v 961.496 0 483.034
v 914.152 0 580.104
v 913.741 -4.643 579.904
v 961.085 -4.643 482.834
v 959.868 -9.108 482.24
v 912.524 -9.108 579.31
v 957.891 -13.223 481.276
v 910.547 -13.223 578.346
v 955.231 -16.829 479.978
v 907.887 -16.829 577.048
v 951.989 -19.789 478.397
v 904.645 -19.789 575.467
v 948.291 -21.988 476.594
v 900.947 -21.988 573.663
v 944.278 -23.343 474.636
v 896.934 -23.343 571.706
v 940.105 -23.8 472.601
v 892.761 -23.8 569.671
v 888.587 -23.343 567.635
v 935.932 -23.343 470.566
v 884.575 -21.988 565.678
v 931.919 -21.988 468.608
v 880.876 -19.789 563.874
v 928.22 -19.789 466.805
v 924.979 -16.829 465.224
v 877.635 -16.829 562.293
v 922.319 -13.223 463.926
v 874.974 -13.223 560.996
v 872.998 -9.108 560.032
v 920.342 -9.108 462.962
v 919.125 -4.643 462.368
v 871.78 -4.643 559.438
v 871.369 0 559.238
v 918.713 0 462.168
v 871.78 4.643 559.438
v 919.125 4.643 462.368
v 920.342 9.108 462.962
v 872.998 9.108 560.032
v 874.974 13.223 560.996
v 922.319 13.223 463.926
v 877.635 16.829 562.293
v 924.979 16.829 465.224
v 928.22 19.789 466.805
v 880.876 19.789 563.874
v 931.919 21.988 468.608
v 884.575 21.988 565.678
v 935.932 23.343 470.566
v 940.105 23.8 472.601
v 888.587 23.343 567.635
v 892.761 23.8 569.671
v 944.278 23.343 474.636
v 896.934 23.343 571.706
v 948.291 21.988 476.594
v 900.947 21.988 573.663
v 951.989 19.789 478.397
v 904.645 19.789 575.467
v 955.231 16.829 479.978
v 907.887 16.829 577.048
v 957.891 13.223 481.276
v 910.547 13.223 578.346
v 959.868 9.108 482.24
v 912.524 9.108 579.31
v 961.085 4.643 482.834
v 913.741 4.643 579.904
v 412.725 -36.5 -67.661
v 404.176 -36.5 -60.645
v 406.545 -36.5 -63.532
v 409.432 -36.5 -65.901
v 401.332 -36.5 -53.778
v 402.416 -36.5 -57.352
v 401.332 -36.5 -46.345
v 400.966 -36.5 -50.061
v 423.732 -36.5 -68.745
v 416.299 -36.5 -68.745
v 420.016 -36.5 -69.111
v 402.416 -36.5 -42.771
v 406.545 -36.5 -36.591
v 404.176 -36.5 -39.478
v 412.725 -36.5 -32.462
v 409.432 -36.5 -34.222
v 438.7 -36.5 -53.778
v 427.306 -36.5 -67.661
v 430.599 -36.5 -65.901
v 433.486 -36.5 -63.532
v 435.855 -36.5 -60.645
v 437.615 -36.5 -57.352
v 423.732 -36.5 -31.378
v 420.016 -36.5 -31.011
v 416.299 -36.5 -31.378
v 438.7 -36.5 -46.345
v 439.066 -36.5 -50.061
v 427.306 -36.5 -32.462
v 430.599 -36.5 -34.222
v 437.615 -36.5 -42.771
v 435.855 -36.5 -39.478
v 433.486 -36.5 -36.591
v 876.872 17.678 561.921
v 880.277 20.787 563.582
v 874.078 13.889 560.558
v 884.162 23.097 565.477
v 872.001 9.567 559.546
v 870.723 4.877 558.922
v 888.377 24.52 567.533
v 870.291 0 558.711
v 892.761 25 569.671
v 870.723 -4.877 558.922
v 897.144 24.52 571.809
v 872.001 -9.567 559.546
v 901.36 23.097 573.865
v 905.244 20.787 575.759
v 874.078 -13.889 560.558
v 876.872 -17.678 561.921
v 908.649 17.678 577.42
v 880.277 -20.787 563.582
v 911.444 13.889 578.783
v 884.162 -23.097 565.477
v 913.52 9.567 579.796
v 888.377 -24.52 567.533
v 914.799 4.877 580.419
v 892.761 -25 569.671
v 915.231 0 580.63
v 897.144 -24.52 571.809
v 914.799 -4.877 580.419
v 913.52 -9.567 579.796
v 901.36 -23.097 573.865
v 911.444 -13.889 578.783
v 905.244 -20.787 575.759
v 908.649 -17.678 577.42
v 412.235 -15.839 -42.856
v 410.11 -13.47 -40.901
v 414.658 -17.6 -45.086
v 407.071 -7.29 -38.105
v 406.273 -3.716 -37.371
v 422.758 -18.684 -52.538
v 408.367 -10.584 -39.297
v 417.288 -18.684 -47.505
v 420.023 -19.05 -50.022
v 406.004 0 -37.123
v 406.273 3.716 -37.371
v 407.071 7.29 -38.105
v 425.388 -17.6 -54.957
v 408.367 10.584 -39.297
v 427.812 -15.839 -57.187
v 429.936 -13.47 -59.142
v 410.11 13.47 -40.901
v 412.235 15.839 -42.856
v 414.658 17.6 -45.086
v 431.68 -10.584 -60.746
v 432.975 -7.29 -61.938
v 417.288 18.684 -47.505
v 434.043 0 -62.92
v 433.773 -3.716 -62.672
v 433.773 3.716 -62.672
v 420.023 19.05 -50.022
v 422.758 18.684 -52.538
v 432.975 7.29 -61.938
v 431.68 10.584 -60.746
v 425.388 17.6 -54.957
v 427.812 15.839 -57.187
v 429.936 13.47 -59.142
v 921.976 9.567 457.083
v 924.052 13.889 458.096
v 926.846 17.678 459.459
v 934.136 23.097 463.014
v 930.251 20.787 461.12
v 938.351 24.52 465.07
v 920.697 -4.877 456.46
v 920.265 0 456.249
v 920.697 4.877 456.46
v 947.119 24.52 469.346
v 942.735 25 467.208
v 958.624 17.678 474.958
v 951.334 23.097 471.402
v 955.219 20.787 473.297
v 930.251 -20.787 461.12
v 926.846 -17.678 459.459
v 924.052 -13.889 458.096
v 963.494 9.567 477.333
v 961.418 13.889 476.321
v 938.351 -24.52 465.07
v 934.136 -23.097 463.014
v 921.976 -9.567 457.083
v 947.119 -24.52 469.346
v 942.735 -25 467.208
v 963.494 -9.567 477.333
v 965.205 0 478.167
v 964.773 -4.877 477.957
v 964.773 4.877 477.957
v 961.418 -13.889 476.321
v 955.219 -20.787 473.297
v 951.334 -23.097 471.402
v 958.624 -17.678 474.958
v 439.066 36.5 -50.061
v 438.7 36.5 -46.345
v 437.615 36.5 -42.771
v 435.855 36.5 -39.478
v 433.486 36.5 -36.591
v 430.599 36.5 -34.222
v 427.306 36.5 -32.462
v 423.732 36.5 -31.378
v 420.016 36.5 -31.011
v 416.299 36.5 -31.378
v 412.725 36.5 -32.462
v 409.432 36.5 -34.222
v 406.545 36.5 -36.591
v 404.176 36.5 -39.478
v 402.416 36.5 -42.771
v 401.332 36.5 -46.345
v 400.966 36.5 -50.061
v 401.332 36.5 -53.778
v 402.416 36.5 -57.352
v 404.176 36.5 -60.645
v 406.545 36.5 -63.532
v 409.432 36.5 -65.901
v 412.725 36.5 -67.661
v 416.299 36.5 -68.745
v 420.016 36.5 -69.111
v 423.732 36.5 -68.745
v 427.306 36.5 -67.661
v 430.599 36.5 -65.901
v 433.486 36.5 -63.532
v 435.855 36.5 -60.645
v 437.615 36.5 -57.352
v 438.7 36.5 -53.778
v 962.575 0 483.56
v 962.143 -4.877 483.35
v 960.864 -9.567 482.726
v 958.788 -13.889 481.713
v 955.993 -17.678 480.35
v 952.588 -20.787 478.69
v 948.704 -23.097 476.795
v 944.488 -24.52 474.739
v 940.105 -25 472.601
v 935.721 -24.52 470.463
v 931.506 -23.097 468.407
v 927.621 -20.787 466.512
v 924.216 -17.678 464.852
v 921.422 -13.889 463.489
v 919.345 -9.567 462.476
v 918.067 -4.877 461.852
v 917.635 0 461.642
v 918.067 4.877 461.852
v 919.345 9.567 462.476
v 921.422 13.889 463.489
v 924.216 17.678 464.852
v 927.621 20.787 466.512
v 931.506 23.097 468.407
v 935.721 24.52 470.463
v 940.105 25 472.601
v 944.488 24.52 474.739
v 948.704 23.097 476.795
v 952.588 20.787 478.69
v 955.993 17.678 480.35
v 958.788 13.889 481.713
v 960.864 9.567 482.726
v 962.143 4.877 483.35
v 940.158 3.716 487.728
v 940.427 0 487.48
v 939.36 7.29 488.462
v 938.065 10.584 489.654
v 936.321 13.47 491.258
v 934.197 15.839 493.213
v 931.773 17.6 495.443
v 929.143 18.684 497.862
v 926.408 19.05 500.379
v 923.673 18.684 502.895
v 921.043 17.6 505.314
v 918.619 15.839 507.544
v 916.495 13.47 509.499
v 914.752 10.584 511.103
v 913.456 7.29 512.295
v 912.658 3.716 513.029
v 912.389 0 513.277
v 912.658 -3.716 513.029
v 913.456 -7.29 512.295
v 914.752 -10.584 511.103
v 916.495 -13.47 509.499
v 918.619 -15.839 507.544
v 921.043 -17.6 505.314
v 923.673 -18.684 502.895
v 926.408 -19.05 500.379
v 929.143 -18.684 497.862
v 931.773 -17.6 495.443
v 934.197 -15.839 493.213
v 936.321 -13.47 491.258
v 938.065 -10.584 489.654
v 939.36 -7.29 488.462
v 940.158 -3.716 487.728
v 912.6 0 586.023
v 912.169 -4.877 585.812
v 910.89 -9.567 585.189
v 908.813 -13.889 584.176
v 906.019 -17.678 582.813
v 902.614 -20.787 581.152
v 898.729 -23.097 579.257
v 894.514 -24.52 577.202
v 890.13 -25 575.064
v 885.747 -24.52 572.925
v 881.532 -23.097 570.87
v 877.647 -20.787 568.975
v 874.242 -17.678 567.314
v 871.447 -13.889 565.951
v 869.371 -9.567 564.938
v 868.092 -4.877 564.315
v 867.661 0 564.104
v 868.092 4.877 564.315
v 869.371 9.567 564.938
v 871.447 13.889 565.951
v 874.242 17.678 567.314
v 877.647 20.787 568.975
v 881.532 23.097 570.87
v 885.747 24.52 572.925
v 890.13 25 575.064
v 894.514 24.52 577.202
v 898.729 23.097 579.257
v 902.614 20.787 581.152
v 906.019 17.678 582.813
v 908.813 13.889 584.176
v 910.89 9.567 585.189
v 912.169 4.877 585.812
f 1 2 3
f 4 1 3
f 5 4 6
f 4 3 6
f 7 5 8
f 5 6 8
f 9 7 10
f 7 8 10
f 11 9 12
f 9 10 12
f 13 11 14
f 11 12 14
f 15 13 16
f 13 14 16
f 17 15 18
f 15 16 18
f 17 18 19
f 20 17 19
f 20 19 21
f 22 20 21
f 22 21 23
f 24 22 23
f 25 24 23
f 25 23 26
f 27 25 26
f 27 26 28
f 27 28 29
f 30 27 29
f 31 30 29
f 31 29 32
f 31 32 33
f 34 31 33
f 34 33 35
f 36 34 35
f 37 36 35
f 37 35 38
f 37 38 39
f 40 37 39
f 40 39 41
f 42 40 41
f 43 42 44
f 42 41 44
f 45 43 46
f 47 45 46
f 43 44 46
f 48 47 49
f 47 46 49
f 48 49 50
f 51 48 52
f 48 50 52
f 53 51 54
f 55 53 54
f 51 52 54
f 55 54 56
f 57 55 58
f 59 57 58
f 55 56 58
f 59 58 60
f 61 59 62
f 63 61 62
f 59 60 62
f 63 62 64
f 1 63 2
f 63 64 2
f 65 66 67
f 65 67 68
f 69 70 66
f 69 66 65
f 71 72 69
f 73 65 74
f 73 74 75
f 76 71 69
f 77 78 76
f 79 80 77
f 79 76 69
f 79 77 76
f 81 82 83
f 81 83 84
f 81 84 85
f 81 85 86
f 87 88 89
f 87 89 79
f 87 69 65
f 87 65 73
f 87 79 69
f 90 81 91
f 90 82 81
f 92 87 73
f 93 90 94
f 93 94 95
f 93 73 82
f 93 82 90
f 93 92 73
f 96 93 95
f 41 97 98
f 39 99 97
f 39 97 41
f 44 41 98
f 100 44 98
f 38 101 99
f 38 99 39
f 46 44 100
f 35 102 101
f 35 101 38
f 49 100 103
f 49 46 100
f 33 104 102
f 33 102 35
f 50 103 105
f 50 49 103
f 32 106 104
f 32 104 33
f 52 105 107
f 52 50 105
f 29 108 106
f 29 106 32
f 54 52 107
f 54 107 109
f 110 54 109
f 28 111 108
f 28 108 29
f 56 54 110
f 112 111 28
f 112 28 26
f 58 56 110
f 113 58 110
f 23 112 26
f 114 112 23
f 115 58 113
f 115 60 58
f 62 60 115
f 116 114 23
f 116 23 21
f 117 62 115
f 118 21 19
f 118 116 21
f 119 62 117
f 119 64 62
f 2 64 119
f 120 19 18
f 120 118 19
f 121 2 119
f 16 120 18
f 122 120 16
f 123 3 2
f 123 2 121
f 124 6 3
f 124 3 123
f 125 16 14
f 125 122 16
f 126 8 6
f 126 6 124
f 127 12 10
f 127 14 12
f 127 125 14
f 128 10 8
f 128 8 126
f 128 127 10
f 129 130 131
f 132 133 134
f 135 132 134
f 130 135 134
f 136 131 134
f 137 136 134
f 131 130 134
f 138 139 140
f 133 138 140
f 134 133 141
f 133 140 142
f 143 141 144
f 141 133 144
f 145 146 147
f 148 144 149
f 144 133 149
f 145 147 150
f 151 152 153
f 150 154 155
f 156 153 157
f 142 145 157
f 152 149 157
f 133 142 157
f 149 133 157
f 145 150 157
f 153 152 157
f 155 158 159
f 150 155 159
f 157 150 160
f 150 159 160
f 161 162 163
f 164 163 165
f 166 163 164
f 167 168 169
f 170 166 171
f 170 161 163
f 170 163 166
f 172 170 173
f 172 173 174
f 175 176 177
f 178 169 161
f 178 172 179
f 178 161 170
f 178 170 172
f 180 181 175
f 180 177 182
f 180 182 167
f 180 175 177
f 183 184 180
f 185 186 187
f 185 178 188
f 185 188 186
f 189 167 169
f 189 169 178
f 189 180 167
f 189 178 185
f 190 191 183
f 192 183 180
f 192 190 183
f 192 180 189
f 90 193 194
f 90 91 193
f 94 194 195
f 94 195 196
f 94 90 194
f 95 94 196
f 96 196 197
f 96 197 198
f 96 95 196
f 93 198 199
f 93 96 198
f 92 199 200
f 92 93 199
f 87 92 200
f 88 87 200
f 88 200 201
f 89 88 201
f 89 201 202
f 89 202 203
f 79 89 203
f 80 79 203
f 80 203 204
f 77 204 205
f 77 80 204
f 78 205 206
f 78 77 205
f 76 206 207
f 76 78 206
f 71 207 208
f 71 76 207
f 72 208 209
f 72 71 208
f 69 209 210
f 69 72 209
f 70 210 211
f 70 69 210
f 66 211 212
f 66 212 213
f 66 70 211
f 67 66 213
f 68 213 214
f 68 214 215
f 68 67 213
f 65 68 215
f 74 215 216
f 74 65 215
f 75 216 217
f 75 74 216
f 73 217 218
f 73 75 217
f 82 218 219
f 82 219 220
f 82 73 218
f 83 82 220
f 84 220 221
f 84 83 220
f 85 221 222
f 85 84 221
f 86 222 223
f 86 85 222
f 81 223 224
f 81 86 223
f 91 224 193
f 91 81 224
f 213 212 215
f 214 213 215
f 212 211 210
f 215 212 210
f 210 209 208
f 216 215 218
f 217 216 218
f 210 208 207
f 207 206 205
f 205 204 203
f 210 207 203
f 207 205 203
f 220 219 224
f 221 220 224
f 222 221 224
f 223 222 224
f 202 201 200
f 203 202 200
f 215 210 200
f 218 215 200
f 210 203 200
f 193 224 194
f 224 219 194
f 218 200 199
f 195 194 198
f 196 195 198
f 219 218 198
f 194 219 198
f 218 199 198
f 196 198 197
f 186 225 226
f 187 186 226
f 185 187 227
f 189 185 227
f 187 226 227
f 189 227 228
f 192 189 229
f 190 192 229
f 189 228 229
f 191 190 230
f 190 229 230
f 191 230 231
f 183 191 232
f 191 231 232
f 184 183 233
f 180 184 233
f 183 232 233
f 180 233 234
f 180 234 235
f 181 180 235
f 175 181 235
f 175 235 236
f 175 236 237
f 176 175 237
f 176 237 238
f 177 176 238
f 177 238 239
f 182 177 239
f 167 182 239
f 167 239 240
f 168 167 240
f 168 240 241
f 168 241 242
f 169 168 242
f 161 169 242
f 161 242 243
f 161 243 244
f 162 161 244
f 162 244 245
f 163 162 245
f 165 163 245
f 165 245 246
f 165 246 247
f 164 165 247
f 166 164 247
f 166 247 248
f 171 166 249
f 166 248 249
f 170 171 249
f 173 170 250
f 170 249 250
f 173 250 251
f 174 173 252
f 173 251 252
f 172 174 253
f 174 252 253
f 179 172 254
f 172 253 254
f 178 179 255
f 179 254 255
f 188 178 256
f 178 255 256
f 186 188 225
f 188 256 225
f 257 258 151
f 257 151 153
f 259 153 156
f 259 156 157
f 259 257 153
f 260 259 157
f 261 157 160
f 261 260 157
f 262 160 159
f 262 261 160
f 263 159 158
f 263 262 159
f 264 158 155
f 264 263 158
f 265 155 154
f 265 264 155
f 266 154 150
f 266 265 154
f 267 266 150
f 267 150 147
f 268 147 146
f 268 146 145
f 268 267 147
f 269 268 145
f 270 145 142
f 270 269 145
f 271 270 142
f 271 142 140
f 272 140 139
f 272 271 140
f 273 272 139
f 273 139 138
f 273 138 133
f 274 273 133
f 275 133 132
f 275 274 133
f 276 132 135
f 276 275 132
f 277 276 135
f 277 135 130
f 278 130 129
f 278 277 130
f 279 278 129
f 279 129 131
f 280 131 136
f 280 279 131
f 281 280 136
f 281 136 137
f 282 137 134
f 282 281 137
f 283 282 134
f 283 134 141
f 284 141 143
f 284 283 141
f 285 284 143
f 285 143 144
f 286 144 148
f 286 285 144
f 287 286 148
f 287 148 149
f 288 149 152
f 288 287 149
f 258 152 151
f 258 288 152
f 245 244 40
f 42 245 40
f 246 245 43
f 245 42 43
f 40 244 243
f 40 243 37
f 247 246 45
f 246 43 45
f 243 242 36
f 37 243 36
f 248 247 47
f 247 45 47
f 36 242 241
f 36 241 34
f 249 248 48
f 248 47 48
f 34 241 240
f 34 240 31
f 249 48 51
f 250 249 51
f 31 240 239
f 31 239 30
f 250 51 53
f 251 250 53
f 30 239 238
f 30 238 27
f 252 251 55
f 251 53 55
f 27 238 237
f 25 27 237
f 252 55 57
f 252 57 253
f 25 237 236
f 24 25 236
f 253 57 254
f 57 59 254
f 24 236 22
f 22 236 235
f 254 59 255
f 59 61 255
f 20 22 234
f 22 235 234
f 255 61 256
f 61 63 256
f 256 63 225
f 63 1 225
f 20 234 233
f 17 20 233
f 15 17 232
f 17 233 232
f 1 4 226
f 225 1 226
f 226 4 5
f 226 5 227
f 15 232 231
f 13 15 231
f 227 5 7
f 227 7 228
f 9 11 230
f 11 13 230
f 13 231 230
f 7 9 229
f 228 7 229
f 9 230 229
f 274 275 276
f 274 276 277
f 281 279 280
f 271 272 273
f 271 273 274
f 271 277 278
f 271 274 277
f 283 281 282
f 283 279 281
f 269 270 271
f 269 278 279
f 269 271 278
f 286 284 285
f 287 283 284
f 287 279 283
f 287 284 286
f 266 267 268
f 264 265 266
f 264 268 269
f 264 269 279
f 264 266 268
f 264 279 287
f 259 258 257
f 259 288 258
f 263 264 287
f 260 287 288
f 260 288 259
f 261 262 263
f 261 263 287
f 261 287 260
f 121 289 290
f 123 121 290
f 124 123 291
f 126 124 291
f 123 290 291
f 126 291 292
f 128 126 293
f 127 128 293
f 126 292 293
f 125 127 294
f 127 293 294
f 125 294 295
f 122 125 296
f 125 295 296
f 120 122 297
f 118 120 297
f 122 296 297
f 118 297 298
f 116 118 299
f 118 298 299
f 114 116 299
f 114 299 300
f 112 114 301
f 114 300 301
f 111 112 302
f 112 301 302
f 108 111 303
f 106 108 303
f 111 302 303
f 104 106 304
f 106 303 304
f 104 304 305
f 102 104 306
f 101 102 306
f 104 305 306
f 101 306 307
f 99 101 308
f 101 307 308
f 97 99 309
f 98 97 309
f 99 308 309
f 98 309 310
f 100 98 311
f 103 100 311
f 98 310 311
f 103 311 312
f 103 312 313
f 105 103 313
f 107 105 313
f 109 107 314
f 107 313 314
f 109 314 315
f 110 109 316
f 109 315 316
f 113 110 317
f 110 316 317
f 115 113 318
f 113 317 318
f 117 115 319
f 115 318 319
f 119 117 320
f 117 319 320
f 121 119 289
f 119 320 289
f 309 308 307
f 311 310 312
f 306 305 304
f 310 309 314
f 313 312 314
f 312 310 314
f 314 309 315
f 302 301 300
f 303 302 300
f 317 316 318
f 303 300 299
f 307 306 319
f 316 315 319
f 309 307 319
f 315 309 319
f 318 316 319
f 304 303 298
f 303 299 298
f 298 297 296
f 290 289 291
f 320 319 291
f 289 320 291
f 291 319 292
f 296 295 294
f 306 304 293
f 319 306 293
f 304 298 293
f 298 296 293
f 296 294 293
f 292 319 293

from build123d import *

# Parameters (mm, degrees)
F5_R      = 19.05
F6_DEPTH  = 36.5
F4_R      = 25
F4_R_2    = 23.8
F7_DEPTH  = 120
F8_DEPTH  = 114
F9_DEPTH  = 120
F10_DEPTH = 6
F2_R      = 19.05


with BuildPart() as f6:
    # F5 (on face) → F6 (new body, symmetric)
    with BuildSketch(Plane.XZ):
        with Locations((420.015544, -50.061494)):
            Circle(F5_R)
    extrude(amount=F6_DEPTH, both=True)


with BuildPart() as f7:
    # F4 (on face) → F7 (new body)
    with BuildSketch(Plane(origin=(-55.522448, 0, 113.837889), x_dir=(0.898794, 0, 0.438371), z_dir=(0.438371, 0, -0.898794))):
        with Locations((1052.135229, 0)):
            Circle(F4_R)
        with Locations((1052.135229, 0)):
            Circle(F4_R_2, mode=Mode.SUBTRACT)
    extrude(amount=F7_DEPTH)

    # F4 (on face) → F8 (cut)
    with BuildSketch(Plane(origin=(-55.522448, 0, 113.837889), x_dir=(0.898794, 0, 0.438371), z_dir=(0.438371, 0, -0.898794))):
        with Locations((1052.135229, 0)):
            Circle(F4_R_2)
        with Locations((1052.135229, 0)):
            Circle(F4_R)
        with Locations((1052.135229, 0)):
            Circle(F4_R_2, mode=Mode.SUBTRACT)
    extrude(amount=F8_DEPTH, mode=Mode.SUBTRACT)

    # F4 (on face) → F9 (join)
    with BuildSketch(Plane(origin=(-55.522448, 0, 113.837889), x_dir=(0.898794, 0, 0.438371), z_dir=(0.438371, 0, -0.898794))):
        with Locations((1052.135229, 0)):
            Circle(F4_R_2)
    extrude(amount=F9_DEPTH)

    # F4 (on face) → F10 (join)
    with BuildSketch(Plane(origin=(-55.522448, 0, 113.837889), x_dir=(0.898794, 0, 0.438371), z_dir=(0.438371, 0, -0.898794))):
        with Locations((1052.135229, 0)):
            Circle(F4_R)
        with Locations((1052.135229, 0)):
            Circle(F4_R_2, mode=Mode.SUBTRACT)
    extrude(amount=F10_DEPTH)


with BuildPart() as f11:
    # F11: sweep along a path in F0
    with BuildLine(Plane.XZ) as f11_path:
        Line((420, -50), (926.384805, 500.400094))
    # F2 (on face) → F11 (sweep)
    with BuildSketch(Plane(origin=(167.623801, 0, 182.193769), x_dir=(0.73592, 0, -0.677069), z_dir=(0.677069, 0, 0.73592))):
        with Locations((342.971563, 0)):
            Circle(F2_R)
    sweep(path=f11_path.line)


solid = Compound([f6.part, f7.part, f11.part])
